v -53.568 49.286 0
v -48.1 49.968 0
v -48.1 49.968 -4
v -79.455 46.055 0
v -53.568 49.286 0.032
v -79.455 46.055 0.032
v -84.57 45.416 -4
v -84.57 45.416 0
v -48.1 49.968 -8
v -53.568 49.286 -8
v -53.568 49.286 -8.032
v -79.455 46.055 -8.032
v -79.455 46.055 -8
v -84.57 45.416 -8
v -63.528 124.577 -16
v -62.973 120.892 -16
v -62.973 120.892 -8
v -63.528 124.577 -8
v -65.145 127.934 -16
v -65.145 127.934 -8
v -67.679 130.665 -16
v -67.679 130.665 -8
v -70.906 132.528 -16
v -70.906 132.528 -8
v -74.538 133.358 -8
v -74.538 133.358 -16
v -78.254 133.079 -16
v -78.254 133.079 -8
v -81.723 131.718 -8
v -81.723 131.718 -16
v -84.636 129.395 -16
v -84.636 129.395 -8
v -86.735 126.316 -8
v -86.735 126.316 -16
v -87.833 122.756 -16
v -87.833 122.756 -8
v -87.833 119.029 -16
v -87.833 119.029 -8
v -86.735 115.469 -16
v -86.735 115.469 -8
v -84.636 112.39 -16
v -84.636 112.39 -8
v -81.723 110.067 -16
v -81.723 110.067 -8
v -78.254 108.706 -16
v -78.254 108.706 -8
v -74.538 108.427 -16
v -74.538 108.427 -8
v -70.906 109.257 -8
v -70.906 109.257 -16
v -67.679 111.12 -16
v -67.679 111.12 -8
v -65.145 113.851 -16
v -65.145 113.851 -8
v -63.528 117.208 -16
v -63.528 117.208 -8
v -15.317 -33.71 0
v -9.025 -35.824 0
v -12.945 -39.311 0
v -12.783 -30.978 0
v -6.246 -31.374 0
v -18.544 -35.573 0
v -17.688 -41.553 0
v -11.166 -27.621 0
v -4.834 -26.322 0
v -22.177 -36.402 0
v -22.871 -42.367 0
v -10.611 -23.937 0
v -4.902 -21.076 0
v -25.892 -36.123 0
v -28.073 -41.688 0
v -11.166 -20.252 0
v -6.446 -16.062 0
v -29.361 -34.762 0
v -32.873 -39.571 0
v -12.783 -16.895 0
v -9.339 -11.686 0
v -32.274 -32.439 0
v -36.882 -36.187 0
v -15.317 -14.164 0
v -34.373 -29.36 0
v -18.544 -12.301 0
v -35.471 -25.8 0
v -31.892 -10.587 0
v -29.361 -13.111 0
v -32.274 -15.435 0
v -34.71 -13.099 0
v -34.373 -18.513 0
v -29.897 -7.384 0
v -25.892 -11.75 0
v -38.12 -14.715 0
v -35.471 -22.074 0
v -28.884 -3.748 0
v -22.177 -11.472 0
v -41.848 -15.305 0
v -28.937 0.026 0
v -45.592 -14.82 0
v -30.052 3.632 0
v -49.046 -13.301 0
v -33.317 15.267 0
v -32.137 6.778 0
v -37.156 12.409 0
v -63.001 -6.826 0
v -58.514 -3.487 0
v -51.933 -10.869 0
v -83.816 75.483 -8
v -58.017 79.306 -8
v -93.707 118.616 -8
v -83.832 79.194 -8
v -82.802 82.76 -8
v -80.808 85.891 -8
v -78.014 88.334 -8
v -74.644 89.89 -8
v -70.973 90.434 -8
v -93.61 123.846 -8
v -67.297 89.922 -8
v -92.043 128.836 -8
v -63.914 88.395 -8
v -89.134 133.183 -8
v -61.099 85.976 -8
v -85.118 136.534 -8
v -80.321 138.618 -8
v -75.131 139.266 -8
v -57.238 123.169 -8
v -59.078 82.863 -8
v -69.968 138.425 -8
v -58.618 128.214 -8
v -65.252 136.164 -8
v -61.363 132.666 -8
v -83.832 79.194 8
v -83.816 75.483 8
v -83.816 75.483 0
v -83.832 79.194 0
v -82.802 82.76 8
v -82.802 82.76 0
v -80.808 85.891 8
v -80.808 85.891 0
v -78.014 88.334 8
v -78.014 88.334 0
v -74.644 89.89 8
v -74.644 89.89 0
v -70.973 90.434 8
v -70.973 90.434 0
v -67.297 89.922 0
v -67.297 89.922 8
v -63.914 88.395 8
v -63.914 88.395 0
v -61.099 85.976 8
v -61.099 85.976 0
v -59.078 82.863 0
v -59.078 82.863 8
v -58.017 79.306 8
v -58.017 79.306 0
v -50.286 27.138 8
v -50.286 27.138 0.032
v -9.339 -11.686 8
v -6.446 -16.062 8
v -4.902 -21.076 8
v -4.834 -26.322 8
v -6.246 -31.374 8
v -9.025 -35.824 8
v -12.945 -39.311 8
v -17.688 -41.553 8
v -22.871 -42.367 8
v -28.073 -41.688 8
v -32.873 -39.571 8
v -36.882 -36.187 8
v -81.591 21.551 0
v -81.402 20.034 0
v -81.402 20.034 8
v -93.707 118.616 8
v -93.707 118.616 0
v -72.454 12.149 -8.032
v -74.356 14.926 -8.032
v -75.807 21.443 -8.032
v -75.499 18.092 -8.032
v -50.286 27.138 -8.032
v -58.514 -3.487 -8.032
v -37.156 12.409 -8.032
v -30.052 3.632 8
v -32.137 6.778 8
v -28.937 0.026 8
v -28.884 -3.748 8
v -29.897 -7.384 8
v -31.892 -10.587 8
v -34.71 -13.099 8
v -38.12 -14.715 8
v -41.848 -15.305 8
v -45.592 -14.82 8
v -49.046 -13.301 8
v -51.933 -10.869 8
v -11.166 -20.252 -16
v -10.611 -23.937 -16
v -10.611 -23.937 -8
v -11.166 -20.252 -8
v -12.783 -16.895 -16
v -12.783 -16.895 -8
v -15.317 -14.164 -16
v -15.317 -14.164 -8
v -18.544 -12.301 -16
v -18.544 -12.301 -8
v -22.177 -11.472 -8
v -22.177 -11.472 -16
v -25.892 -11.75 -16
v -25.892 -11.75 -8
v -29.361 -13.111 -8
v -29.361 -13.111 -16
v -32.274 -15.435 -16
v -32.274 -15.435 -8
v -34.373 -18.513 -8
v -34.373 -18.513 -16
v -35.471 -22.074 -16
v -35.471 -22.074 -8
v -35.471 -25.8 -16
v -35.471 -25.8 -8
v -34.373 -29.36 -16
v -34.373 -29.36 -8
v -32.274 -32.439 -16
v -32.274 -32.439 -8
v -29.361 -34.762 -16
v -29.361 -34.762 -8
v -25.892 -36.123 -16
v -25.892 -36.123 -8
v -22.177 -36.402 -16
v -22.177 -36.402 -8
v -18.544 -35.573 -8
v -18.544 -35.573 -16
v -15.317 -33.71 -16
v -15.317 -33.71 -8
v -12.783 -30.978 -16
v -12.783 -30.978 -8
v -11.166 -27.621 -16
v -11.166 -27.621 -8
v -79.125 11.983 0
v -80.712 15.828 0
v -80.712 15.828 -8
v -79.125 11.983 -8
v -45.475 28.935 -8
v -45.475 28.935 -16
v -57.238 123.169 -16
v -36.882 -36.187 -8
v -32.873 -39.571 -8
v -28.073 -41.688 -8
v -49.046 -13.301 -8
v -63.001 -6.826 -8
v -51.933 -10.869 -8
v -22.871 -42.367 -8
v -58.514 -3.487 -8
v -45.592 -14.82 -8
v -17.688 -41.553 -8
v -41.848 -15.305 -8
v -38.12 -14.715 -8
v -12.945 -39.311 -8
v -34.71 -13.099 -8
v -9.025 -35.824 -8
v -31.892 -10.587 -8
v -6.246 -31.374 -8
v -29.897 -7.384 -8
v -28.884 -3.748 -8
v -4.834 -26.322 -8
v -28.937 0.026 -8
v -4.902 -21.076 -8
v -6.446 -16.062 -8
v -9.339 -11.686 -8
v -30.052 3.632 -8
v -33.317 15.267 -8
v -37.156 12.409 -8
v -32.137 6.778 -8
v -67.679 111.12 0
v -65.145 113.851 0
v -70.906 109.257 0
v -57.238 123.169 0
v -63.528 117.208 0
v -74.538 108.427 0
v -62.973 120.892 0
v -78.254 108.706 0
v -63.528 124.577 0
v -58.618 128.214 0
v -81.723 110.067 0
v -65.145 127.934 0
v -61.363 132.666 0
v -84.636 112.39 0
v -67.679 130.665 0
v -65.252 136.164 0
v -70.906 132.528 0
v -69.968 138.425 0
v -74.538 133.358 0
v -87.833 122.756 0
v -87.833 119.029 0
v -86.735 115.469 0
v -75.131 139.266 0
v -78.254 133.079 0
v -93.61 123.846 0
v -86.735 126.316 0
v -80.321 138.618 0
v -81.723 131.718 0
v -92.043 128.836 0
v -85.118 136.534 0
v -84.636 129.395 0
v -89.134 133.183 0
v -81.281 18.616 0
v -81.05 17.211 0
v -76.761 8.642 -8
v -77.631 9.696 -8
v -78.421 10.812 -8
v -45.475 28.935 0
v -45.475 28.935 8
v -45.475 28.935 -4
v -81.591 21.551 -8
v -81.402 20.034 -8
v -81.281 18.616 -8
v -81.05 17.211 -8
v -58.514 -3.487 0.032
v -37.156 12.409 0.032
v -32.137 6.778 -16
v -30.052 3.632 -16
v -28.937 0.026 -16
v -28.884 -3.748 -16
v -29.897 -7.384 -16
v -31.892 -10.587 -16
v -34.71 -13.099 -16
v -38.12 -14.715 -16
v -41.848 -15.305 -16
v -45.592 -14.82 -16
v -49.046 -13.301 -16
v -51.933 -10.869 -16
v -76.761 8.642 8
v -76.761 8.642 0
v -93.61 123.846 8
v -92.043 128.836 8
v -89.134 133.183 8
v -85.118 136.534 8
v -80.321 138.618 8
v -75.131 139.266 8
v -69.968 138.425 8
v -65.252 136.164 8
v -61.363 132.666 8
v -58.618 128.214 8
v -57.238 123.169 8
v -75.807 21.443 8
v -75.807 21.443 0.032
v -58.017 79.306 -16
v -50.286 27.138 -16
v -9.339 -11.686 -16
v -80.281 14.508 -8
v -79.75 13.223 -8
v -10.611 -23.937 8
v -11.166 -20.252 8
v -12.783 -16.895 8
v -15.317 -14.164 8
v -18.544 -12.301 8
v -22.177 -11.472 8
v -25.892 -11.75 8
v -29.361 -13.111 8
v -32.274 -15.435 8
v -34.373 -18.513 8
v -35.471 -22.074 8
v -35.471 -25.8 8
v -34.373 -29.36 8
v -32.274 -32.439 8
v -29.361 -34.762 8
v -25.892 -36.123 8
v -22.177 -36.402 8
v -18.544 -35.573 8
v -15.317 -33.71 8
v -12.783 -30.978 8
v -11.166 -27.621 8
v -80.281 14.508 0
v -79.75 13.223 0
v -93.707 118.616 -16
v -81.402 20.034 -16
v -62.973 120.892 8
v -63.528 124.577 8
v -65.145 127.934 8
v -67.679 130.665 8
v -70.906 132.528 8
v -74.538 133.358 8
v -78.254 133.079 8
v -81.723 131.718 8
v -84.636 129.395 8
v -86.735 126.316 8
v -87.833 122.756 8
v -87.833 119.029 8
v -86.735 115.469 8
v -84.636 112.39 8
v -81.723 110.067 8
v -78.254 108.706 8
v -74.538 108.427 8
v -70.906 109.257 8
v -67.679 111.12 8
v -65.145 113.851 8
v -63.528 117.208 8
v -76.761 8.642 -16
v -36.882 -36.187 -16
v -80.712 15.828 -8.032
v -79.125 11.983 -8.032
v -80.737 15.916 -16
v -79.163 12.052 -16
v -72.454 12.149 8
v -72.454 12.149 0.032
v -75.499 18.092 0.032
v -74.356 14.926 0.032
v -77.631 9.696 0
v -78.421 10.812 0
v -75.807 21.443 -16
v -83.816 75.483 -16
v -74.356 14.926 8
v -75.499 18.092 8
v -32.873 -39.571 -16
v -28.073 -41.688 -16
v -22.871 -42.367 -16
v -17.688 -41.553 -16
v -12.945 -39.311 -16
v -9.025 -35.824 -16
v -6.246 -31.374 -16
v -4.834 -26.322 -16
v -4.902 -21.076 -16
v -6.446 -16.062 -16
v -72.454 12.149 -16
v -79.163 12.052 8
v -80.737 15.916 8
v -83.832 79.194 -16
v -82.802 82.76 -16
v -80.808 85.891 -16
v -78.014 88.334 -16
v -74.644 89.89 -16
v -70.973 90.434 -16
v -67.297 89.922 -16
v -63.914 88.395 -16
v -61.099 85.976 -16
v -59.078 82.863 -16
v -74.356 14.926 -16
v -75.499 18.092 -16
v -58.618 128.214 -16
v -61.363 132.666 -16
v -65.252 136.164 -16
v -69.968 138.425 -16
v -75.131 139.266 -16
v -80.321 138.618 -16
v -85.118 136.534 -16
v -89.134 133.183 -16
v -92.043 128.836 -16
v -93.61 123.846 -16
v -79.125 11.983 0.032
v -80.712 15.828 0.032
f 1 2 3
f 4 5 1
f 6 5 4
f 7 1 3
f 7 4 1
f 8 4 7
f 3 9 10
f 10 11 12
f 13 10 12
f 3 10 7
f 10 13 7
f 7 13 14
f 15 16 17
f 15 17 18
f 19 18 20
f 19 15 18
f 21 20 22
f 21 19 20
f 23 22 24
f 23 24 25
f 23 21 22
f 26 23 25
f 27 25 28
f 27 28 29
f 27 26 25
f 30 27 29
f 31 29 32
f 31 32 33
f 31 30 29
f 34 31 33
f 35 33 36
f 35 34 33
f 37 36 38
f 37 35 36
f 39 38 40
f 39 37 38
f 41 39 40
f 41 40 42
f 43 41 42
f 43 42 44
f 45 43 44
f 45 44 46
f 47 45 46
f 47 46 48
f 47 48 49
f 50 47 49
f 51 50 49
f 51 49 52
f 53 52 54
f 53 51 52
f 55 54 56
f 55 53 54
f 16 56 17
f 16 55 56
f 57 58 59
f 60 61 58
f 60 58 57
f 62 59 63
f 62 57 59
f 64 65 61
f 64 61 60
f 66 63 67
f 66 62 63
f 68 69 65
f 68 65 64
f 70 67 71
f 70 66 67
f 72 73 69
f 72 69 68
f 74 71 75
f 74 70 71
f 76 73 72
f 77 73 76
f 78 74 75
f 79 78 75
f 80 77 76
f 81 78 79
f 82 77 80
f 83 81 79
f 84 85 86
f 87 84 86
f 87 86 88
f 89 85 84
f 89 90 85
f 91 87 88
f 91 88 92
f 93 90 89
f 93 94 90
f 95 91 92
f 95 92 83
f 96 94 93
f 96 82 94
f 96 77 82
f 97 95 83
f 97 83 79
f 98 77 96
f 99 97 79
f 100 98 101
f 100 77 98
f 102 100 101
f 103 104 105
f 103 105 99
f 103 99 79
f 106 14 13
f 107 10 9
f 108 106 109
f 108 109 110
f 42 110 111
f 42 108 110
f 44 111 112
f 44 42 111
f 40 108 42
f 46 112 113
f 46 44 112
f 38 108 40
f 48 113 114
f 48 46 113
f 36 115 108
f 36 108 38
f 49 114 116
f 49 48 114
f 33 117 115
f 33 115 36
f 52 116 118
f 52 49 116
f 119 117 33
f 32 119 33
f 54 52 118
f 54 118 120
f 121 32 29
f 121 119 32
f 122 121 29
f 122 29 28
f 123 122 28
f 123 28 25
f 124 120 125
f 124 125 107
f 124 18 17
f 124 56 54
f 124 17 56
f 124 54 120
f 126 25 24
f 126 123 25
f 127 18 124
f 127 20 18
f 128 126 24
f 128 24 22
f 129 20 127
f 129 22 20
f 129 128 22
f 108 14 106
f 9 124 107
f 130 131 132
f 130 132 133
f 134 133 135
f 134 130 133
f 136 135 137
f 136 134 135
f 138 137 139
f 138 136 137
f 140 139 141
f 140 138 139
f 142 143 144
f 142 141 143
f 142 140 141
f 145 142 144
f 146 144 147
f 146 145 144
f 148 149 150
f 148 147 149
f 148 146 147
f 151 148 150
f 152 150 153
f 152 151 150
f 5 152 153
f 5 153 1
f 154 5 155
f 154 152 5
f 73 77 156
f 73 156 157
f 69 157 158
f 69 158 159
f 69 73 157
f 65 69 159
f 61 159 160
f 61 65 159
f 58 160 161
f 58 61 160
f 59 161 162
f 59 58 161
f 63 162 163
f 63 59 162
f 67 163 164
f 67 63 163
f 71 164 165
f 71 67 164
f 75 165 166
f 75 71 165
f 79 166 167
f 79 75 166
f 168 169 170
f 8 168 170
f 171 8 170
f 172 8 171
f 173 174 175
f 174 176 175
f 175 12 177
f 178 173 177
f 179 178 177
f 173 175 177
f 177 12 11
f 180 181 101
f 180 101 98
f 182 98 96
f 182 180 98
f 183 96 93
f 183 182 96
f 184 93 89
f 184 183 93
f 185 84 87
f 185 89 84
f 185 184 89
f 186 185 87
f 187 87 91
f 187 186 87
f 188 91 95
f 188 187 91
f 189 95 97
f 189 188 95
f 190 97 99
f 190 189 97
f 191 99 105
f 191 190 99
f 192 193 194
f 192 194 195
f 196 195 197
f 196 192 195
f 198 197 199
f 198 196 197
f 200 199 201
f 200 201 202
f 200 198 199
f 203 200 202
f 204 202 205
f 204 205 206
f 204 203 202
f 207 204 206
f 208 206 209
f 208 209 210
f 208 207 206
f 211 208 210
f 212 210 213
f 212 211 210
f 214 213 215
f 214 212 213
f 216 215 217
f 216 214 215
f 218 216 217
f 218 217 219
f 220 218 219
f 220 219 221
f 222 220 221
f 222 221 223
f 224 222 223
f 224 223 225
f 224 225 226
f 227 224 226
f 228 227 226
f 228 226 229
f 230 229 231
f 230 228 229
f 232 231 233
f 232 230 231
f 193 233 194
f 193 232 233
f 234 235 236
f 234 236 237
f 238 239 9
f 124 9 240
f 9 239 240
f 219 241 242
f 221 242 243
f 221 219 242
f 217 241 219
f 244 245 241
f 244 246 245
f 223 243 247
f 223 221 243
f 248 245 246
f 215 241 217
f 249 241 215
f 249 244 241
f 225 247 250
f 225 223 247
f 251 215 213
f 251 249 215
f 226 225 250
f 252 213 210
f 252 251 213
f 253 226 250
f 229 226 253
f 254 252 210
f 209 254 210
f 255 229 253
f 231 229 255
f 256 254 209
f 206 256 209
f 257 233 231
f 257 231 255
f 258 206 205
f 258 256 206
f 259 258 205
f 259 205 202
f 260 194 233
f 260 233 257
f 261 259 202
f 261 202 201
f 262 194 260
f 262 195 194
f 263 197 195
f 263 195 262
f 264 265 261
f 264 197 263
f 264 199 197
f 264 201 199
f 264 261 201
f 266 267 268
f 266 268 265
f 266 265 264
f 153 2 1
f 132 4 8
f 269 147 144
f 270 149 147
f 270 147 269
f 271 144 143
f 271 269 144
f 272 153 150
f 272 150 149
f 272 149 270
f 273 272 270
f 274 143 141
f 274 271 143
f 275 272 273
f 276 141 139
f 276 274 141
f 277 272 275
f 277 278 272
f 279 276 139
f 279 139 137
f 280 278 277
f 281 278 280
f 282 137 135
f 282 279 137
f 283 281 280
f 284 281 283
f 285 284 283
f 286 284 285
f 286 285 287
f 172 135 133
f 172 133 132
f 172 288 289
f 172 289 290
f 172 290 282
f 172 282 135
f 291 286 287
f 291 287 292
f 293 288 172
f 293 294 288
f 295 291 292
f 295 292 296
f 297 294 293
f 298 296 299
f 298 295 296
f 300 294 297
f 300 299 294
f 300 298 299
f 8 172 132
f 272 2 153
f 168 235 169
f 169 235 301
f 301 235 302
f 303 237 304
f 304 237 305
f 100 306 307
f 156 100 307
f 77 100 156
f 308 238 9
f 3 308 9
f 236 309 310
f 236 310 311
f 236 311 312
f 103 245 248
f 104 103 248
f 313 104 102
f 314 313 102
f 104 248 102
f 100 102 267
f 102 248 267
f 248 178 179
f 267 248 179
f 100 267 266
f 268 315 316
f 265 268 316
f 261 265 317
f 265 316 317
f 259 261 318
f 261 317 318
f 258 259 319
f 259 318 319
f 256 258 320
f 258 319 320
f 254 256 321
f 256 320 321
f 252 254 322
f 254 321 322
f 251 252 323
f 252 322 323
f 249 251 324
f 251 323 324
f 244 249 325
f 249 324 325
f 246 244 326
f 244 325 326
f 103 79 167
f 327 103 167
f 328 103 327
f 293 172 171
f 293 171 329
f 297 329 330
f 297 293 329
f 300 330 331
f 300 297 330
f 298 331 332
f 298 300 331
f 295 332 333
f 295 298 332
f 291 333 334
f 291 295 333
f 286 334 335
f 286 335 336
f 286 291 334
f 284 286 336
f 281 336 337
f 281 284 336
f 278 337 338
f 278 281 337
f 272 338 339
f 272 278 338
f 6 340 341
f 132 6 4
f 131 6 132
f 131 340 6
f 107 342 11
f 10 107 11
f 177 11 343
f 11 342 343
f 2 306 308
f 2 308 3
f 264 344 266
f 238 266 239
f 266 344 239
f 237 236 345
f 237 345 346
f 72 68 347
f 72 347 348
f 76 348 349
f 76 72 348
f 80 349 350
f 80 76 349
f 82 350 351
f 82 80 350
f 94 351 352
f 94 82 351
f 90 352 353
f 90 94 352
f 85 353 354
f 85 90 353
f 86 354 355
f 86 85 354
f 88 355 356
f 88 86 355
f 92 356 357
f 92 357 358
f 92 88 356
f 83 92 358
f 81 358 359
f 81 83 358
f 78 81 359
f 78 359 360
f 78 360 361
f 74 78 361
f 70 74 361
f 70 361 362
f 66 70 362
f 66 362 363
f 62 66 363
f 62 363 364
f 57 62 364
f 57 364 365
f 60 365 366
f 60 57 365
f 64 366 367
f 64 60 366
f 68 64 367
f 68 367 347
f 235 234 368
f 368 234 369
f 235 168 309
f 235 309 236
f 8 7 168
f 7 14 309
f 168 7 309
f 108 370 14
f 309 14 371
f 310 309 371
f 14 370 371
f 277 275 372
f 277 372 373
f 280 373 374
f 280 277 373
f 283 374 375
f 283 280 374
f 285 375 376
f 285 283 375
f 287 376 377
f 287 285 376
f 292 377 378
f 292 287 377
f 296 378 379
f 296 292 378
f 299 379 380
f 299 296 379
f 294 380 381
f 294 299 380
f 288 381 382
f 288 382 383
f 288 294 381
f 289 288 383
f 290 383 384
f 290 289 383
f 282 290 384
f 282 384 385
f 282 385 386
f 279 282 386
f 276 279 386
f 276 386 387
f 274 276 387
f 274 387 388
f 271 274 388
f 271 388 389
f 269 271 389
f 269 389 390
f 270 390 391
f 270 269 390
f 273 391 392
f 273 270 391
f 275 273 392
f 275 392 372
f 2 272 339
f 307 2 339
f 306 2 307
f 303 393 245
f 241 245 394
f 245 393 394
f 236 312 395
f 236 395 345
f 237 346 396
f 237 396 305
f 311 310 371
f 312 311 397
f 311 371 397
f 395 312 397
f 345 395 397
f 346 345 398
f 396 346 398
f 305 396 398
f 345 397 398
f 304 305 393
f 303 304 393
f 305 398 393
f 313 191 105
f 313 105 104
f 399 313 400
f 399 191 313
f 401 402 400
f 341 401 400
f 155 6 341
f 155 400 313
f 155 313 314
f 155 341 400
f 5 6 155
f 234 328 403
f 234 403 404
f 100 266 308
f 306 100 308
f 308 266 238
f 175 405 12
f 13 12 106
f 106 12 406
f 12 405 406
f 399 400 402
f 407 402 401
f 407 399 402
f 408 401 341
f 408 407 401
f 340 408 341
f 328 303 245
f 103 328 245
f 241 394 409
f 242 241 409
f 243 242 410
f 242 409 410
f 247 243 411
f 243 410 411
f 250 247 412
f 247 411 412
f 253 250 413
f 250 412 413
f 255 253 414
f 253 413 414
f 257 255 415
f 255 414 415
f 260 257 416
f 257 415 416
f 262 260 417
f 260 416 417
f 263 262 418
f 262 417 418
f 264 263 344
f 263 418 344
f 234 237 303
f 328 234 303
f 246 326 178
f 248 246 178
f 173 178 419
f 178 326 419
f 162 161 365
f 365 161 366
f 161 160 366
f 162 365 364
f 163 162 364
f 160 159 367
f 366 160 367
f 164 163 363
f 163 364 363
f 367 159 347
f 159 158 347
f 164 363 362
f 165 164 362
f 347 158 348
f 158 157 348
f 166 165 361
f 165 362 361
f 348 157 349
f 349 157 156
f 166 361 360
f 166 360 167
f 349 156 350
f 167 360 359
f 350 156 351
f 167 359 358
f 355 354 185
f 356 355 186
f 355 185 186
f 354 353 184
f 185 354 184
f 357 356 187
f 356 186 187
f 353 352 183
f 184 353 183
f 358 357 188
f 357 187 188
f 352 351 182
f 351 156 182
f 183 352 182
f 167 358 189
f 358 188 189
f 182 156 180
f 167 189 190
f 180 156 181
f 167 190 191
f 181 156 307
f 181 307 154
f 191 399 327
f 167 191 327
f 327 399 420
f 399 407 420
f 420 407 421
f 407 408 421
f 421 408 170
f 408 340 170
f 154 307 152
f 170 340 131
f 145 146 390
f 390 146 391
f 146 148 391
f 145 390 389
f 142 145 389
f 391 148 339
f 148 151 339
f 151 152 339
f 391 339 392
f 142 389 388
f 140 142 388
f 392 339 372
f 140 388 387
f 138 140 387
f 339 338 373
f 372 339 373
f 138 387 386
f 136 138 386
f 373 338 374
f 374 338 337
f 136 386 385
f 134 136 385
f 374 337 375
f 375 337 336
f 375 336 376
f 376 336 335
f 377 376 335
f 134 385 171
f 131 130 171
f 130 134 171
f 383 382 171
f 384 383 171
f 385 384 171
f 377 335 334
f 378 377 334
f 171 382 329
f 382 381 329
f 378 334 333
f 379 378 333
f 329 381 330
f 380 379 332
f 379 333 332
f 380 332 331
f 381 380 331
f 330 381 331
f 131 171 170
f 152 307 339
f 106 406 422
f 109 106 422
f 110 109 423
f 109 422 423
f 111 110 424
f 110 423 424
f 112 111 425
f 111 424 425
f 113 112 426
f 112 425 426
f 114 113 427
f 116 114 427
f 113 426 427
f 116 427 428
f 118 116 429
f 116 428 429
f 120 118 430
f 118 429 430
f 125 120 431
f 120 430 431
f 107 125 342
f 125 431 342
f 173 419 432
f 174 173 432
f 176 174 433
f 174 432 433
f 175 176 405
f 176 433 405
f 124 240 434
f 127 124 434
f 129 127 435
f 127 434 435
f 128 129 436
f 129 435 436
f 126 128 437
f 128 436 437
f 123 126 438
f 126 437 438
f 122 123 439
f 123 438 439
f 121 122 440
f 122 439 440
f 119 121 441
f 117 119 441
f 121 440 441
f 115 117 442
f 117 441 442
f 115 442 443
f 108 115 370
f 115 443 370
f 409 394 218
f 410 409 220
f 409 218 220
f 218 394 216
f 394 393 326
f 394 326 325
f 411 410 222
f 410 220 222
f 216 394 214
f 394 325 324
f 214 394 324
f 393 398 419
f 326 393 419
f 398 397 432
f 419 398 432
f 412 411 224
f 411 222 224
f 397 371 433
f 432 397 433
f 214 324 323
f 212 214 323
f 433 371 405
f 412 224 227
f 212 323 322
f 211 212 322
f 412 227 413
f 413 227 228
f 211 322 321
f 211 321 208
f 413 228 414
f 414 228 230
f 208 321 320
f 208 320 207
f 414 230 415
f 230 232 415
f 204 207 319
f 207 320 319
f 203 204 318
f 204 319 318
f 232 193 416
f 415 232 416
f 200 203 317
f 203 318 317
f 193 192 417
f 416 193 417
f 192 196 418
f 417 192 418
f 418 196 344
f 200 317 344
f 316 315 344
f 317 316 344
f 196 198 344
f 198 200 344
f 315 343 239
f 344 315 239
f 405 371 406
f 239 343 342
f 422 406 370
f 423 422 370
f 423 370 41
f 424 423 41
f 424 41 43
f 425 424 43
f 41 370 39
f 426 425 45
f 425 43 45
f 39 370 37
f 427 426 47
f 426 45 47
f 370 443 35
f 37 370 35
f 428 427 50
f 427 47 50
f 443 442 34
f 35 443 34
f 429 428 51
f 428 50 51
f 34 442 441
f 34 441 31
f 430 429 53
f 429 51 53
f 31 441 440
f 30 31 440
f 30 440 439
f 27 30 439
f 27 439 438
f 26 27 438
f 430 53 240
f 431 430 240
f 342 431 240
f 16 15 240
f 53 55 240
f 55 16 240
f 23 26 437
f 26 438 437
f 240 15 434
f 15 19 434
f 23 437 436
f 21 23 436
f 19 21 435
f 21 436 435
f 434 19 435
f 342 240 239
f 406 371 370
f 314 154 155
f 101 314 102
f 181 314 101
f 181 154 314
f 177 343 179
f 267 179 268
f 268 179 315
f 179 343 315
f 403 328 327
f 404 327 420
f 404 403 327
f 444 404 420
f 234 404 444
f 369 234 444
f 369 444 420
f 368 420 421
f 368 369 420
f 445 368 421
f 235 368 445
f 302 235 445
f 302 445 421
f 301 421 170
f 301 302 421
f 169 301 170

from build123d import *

# Parameters (mm, degrees)
SKETCH_1_R          = 12.5
EXTRUDE_1_DEPTH     = 8
EXTRUDE_START       = -8
SKETCH_2_R          = 12.5
EXTRUDE_2_DEPTH     = 8
CUT_EXTRUDE_6_DEPTH = 30
EXTRUDE_START_2     = -0.031547984
EXTRUDE_3_DEPTH     = 4.031547984
MIRROR_START        = -16
MIRROR_1_OUTLINE_R  = 12.5
MIRROR_1_DEPTH      = 8
MIRROR_START_2      = -8.031547984
MIRROR_1_2_DEPTH    = 4.031547984


# Read off the part's stored shape, not the designer's step: 镜向1
with BuildPart() as part:
    # 草图1 → 凸台-拉伸1 (new body)
    with BuildSketch(Plane.XY):
        with BuildLine():
            Line((-49.218570577, 33.143230451), (-9.339427202, -11.685933312))
            ThreePointArc((-9.339427202, -11.685933312), (-10.860056091, -37.708027961), (-36.882150741, -36.187399071))
            Line((-36.882150741, -36.187399071), (-76.761294116, 8.641764691))
            ThreePointArc((-76.761294116, 8.641764691), (-75.240665226, 34.663859341), (-49.218570577, 33.143230451))
        make_face()
        with Locations((-23.110788971, -23.936666192)):
            Circle(SKETCH_1_R, mode=Mode.SUBTRACT)
        with Locations((-62.989932346, 20.892497571)):
            Circle(SKETCH_1_R, mode=Mode.SUBTRACT)
    extrude(amount=EXTRUDE_1_DEPTH)

    # 草图2 → 凸台-拉伸2 (add)
    with BuildSketch(Plane.XY.offset(8).offset(EXTRUDE_START)):
        with BuildLine():
            Line((-81.224750465, 18.616304916), (-93.707423119, 118.616304916))
            ThreePointArc((-93.707423119, 118.616304916), (-77.748797655, 139.12731569), (-57.237786881, 123.168690226))
            Line((-57.237786881, 123.168690226), (-44.755114228, 23.168690226))
            ThreePointArc((-44.755114228, 23.168690226), (-60.713739692, 2.657679452), (-81.224750465, 18.616304916))
        make_face()
        with Locations((-62.989932346, 20.892497571)):
            Circle(SKETCH_2_R, mode=Mode.SUBTRACT)
        with Locations((-75.472605, 120.892497571)):
            Circle(SKETCH_2_R, mode=Mode.SUBTRACT)
    extrude(amount=EXTRUDE_2_DEPTH)

    # 草图4 → 切除-拉伸6 (cut)
    with BuildSketch(Plane.XY.offset(8)):
        with BuildLine():
            Line((-50.286228122, 27.138087208), (-32.136603064, 6.778447679))
            ThreePointArc((-32.136603064, 6.778447679), (-33.211064798, -11.943932547), (-51.933445024, -10.869470813))
            Line((-51.933445024, -10.869470813), (-72.45355192, 12.149295588))
            ThreePointArc((-72.45355192, 12.149295588), (-75.02839357, 16.472286713), (-75.807301146, 21.443339396))
            Line((-75.807301146, 21.443339396), (-83.815726922, 75.482800481))
            ThreePointArc((-83.815726922, 75.482800481), (-72.828124355, 90.29362358), (-58.017301256, 79.306021012))
            Line((-58.017301256, 79.306021012), (-50.286228122, 27.138087208))
        make_face()
    extrude(amount=-CUT_EXTRUDE_6_DEPTH, mode=Mode.SUBTRACT)

    # 草图5 → 凸台-拉伸3 (add)
    with BuildSketch(Plane(origin=(0, 0, 0), x_dir=(-1, 0, 0), z_dir=(0, 0, -1)).offset(EXTRUDE_START_2)):
        Polygon((48.100432454, 49.968385441), (84.570068691, 45.416000132), (81.591125202, 21.551371363), (80.712358407, 15.828262623), (79.125142105, 11.982622874), (76.761294116, 8.641764691), (63.001048061, -6.826479398), (33.316578165, 15.267394572), (45.474886231, 28.934859247), align=None)
    extrude(amount=EXTRUDE_3_DEPTH)



with BuildPart() as body_2:
    # 镜向1 outline → 镜向1 (new body)
    with BuildSketch(Plane.XY.offset(MIRROR_START)):
        with BuildLine():
            ThreePointArc((-81.401718429, 20.034013842), (-80.059923167, 13.939349041), (-76.761294116, 8.641764691))
            Line((-76.761294116, 8.641764691), (-36.882150741, -36.187399071))
            ThreePointArc((-36.882150741, -36.187399071), (-10.860056092, -37.708027961), (-9.339427202, -11.685933312))
            Line((-9.339427202, -11.685933312), (-45.474886231, 28.934859247))
            Line((-45.474886231, 28.934859247), (-57.237786881, 123.168690226))
            ThreePointArc((-57.237786881, 123.168690226), (-77.748797655, 139.12731569), (-93.707423119, 118.616304916))
            Line((-93.707423119, 118.616304916), (-81.401718429, 20.034013842))
        make_face()
        with BuildLine():
            Line((-75.807301146, 21.443339396), (-83.815726922, 75.482800481))
            ThreePointArc((-83.815726922, 75.482800481), (-72.828124355, 90.29362358), (-58.017301256, 79.306021012))
            Line((-58.017301256, 79.306021012), (-50.286228122, 27.138087208))
            Line((-50.286228122, 27.138087208), (-32.136603064, 6.778447679))
            ThreePointArc((-32.136603064, 6.778447679), (-33.211064798, -11.943932547), (-51.933445024, -10.869470813))
            Line((-51.933445024, -10.869470813), (-72.45355192, 12.149295588))
            ThreePointArc((-72.45355192, 12.149295588), (-75.02839357, 16.472286713), (-75.807301146, 21.443339396))
        make_face(mode=Mode.SUBTRACT)
        with Locations((-75.472605, 120.892497571)):
            Circle(MIRROR_1_OUTLINE_R, mode=Mode.SUBTRACT)
        with Locations((-23.110788971, -23.936666192)):
            Circle(MIRROR_1_OUTLINE_R, mode=Mode.SUBTRACT)
    extrude(amount=MIRROR_1_DEPTH)


with BuildPart() as part_1:
    add(part.part)

    add(body_2.part)  # Mirror 1 2 merges body 2
    # Mirror 1 2 outline → Mirror 1 2 (add)
    with BuildSketch(Plane.XY.offset(MIRROR_START_2)):
        Polygon((-81.591125202, 21.551371363), (-80.712358407, 15.828262623), (-79.125142105, 11.982622874), (-76.761294116, 8.641764691), (-63.001048061, -6.826479398), (-33.316578165, 15.267394572), (-45.474886231, 28.934859247), (-48.100432453, 49.968385441), (-84.570068691, 45.416000132), align=None)
    extrude(amount=MIRROR_1_2_DEPTH)


solid = part_1.part
